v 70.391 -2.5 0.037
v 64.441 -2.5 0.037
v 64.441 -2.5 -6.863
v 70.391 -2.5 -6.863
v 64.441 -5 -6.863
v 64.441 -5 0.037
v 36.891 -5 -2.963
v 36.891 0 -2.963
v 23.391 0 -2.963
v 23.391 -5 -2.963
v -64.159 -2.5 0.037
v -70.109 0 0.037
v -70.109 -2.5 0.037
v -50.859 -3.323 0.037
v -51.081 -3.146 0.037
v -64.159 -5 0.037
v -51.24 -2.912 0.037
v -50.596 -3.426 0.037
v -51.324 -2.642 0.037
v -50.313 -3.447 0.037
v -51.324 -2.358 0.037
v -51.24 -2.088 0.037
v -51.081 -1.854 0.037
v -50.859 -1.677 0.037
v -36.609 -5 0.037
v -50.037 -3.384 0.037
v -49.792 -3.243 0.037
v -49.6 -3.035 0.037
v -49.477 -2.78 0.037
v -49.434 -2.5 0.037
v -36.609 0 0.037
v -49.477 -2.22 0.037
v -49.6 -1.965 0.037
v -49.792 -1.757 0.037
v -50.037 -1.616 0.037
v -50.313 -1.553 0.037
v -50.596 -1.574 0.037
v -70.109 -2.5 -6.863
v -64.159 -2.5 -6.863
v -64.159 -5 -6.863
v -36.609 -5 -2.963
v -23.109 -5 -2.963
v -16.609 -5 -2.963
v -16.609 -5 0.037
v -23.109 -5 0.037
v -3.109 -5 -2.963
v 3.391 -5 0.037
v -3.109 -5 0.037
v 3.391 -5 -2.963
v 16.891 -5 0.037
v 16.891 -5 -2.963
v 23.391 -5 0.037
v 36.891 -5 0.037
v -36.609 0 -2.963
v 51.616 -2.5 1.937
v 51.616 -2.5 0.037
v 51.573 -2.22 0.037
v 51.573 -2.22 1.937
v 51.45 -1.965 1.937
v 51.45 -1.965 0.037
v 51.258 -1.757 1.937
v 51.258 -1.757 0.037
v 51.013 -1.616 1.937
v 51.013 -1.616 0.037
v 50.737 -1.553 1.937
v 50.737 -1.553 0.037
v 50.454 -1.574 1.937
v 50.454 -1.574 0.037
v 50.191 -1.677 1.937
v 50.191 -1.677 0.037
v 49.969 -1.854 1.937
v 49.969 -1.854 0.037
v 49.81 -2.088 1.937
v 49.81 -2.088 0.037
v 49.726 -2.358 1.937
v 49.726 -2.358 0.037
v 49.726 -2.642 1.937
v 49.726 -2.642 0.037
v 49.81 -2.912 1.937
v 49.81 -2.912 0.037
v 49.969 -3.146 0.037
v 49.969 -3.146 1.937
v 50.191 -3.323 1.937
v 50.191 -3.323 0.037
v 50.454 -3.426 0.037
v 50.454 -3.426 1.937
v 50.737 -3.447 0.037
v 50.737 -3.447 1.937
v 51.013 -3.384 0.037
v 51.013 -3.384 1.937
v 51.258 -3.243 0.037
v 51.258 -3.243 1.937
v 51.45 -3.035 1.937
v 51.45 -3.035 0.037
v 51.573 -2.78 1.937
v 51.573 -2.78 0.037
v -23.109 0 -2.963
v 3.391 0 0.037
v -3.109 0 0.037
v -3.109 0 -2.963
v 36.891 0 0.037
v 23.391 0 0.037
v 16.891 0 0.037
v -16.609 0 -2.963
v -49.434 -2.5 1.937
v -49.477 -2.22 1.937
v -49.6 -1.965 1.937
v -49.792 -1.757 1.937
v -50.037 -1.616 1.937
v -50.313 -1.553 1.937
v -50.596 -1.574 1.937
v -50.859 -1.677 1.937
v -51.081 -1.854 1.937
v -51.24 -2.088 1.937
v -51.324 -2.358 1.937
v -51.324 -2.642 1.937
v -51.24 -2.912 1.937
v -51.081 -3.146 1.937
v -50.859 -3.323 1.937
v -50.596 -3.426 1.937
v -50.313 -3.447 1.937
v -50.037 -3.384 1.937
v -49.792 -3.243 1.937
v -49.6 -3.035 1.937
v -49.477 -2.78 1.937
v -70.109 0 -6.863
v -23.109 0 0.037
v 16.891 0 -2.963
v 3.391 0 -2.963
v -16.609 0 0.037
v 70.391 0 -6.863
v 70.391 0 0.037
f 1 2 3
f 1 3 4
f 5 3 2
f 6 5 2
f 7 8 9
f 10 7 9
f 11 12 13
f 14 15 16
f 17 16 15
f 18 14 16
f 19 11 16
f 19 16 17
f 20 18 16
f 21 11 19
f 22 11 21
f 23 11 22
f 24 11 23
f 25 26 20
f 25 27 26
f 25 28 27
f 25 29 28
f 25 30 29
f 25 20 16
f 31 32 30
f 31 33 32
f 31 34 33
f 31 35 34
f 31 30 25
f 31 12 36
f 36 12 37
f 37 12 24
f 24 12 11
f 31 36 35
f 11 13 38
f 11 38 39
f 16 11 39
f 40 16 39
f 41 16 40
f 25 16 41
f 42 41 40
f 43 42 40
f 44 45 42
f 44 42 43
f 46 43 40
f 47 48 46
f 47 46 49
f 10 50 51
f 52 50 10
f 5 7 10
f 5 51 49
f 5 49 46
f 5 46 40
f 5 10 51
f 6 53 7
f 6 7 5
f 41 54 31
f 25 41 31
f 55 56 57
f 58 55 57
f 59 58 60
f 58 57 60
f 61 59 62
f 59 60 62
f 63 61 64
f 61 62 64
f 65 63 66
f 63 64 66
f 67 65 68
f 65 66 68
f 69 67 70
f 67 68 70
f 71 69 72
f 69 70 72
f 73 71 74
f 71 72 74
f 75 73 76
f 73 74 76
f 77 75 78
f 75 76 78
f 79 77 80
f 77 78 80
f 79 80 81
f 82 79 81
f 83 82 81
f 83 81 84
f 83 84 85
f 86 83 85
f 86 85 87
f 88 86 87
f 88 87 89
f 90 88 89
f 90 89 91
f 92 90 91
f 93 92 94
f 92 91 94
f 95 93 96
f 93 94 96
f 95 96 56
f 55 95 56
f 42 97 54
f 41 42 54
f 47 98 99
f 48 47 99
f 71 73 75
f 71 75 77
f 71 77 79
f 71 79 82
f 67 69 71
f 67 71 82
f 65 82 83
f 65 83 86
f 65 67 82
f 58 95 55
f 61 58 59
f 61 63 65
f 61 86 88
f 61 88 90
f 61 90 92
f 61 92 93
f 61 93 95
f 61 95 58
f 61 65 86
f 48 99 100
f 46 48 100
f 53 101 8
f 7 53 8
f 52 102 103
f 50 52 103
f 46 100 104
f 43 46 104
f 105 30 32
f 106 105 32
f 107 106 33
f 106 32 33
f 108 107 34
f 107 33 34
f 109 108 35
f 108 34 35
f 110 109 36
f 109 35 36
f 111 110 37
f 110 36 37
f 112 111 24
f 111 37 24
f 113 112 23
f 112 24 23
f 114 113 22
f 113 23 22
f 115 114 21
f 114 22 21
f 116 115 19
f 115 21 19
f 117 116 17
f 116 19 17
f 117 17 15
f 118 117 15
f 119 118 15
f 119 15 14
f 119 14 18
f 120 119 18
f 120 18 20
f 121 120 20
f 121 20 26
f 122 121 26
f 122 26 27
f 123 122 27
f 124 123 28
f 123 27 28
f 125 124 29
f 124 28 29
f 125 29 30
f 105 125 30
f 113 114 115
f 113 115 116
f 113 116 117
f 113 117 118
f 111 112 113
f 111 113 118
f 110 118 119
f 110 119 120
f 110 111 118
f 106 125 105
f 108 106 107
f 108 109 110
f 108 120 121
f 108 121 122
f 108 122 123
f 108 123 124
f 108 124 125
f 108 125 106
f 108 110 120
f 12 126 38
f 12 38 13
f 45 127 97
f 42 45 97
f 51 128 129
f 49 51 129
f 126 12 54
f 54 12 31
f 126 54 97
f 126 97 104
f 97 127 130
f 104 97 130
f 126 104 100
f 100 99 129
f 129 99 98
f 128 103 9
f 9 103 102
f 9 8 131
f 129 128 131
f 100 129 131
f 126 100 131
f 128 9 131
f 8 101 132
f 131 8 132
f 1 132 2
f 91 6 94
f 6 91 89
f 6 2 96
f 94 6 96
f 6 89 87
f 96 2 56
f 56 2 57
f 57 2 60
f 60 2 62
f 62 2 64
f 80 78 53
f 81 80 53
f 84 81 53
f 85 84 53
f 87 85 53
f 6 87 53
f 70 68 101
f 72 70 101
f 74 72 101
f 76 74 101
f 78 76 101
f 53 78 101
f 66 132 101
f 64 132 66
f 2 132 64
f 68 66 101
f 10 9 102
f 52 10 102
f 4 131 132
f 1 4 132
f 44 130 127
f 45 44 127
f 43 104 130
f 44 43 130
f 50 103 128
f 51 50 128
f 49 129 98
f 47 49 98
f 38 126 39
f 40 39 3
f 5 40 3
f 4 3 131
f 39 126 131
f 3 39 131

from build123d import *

# Parameters (mm, degrees)
F1_DEPTH = 5
F0_W     = 5.95
F0_H     = 6.9
F2_DEPTH = 2.5
F5_R     = 0.95
F6_DEPTH = 1.9
F4_R     = 0.95
F7_DEPTH = 1.9


with BuildPart() as f1:
    # F0 (on Front) → F1 (new body)
    with BuildSketch(Plane.XZ):
        Polygon((64.440538, -6.86276), (64.440538, 0.03724), (36.890538, 0.03724), (36.890538, -2.96276), (23.390538, -2.96276), (23.390538, 0.03724), (16.890538, 0.03724), (16.890538, -2.96276), (3.390538, -2.96276), (3.390538, 0.03724), (-3.109462, 0.03724), (-3.109462, -2.96276), (-16.609462, -2.96276), (-16.609462, 0.03724), (-23.109462, 0.03724), (-23.109462, -2.96276), (-36.609462, -2.96276), (-36.609462, 0.03724), (-64.159462, 0.03724), (-64.159462, -6.86276), align=None)
    extrude(amount=F1_DEPTH)

    # F0 (on Front) → F2 (join)
    with BuildSketch(Plane.XZ):
        with Locations((-67.134462, -3.41276)):
            Rectangle(F0_W, F0_H)
        with Locations((67.415538, -3.41276)):
            Rectangle(F0_W, F0_H)
    extrude(amount=F2_DEPTH)

    # F5 (on face) → F6 (join)
    with BuildSketch(Plane.XY.offset(0.03724)):
        with Locations((-50.384462, -2.5)):
            Circle(F5_R)
    extrude(amount=F6_DEPTH)

    # F4 (on face) → F7 (join)
    with BuildSketch(Plane.XY.offset(0.03724)):
        with Locations((50.665538, -2.5)):
            Circle(F4_R)
    extrude(amount=F7_DEPTH)


solid = f1.part
